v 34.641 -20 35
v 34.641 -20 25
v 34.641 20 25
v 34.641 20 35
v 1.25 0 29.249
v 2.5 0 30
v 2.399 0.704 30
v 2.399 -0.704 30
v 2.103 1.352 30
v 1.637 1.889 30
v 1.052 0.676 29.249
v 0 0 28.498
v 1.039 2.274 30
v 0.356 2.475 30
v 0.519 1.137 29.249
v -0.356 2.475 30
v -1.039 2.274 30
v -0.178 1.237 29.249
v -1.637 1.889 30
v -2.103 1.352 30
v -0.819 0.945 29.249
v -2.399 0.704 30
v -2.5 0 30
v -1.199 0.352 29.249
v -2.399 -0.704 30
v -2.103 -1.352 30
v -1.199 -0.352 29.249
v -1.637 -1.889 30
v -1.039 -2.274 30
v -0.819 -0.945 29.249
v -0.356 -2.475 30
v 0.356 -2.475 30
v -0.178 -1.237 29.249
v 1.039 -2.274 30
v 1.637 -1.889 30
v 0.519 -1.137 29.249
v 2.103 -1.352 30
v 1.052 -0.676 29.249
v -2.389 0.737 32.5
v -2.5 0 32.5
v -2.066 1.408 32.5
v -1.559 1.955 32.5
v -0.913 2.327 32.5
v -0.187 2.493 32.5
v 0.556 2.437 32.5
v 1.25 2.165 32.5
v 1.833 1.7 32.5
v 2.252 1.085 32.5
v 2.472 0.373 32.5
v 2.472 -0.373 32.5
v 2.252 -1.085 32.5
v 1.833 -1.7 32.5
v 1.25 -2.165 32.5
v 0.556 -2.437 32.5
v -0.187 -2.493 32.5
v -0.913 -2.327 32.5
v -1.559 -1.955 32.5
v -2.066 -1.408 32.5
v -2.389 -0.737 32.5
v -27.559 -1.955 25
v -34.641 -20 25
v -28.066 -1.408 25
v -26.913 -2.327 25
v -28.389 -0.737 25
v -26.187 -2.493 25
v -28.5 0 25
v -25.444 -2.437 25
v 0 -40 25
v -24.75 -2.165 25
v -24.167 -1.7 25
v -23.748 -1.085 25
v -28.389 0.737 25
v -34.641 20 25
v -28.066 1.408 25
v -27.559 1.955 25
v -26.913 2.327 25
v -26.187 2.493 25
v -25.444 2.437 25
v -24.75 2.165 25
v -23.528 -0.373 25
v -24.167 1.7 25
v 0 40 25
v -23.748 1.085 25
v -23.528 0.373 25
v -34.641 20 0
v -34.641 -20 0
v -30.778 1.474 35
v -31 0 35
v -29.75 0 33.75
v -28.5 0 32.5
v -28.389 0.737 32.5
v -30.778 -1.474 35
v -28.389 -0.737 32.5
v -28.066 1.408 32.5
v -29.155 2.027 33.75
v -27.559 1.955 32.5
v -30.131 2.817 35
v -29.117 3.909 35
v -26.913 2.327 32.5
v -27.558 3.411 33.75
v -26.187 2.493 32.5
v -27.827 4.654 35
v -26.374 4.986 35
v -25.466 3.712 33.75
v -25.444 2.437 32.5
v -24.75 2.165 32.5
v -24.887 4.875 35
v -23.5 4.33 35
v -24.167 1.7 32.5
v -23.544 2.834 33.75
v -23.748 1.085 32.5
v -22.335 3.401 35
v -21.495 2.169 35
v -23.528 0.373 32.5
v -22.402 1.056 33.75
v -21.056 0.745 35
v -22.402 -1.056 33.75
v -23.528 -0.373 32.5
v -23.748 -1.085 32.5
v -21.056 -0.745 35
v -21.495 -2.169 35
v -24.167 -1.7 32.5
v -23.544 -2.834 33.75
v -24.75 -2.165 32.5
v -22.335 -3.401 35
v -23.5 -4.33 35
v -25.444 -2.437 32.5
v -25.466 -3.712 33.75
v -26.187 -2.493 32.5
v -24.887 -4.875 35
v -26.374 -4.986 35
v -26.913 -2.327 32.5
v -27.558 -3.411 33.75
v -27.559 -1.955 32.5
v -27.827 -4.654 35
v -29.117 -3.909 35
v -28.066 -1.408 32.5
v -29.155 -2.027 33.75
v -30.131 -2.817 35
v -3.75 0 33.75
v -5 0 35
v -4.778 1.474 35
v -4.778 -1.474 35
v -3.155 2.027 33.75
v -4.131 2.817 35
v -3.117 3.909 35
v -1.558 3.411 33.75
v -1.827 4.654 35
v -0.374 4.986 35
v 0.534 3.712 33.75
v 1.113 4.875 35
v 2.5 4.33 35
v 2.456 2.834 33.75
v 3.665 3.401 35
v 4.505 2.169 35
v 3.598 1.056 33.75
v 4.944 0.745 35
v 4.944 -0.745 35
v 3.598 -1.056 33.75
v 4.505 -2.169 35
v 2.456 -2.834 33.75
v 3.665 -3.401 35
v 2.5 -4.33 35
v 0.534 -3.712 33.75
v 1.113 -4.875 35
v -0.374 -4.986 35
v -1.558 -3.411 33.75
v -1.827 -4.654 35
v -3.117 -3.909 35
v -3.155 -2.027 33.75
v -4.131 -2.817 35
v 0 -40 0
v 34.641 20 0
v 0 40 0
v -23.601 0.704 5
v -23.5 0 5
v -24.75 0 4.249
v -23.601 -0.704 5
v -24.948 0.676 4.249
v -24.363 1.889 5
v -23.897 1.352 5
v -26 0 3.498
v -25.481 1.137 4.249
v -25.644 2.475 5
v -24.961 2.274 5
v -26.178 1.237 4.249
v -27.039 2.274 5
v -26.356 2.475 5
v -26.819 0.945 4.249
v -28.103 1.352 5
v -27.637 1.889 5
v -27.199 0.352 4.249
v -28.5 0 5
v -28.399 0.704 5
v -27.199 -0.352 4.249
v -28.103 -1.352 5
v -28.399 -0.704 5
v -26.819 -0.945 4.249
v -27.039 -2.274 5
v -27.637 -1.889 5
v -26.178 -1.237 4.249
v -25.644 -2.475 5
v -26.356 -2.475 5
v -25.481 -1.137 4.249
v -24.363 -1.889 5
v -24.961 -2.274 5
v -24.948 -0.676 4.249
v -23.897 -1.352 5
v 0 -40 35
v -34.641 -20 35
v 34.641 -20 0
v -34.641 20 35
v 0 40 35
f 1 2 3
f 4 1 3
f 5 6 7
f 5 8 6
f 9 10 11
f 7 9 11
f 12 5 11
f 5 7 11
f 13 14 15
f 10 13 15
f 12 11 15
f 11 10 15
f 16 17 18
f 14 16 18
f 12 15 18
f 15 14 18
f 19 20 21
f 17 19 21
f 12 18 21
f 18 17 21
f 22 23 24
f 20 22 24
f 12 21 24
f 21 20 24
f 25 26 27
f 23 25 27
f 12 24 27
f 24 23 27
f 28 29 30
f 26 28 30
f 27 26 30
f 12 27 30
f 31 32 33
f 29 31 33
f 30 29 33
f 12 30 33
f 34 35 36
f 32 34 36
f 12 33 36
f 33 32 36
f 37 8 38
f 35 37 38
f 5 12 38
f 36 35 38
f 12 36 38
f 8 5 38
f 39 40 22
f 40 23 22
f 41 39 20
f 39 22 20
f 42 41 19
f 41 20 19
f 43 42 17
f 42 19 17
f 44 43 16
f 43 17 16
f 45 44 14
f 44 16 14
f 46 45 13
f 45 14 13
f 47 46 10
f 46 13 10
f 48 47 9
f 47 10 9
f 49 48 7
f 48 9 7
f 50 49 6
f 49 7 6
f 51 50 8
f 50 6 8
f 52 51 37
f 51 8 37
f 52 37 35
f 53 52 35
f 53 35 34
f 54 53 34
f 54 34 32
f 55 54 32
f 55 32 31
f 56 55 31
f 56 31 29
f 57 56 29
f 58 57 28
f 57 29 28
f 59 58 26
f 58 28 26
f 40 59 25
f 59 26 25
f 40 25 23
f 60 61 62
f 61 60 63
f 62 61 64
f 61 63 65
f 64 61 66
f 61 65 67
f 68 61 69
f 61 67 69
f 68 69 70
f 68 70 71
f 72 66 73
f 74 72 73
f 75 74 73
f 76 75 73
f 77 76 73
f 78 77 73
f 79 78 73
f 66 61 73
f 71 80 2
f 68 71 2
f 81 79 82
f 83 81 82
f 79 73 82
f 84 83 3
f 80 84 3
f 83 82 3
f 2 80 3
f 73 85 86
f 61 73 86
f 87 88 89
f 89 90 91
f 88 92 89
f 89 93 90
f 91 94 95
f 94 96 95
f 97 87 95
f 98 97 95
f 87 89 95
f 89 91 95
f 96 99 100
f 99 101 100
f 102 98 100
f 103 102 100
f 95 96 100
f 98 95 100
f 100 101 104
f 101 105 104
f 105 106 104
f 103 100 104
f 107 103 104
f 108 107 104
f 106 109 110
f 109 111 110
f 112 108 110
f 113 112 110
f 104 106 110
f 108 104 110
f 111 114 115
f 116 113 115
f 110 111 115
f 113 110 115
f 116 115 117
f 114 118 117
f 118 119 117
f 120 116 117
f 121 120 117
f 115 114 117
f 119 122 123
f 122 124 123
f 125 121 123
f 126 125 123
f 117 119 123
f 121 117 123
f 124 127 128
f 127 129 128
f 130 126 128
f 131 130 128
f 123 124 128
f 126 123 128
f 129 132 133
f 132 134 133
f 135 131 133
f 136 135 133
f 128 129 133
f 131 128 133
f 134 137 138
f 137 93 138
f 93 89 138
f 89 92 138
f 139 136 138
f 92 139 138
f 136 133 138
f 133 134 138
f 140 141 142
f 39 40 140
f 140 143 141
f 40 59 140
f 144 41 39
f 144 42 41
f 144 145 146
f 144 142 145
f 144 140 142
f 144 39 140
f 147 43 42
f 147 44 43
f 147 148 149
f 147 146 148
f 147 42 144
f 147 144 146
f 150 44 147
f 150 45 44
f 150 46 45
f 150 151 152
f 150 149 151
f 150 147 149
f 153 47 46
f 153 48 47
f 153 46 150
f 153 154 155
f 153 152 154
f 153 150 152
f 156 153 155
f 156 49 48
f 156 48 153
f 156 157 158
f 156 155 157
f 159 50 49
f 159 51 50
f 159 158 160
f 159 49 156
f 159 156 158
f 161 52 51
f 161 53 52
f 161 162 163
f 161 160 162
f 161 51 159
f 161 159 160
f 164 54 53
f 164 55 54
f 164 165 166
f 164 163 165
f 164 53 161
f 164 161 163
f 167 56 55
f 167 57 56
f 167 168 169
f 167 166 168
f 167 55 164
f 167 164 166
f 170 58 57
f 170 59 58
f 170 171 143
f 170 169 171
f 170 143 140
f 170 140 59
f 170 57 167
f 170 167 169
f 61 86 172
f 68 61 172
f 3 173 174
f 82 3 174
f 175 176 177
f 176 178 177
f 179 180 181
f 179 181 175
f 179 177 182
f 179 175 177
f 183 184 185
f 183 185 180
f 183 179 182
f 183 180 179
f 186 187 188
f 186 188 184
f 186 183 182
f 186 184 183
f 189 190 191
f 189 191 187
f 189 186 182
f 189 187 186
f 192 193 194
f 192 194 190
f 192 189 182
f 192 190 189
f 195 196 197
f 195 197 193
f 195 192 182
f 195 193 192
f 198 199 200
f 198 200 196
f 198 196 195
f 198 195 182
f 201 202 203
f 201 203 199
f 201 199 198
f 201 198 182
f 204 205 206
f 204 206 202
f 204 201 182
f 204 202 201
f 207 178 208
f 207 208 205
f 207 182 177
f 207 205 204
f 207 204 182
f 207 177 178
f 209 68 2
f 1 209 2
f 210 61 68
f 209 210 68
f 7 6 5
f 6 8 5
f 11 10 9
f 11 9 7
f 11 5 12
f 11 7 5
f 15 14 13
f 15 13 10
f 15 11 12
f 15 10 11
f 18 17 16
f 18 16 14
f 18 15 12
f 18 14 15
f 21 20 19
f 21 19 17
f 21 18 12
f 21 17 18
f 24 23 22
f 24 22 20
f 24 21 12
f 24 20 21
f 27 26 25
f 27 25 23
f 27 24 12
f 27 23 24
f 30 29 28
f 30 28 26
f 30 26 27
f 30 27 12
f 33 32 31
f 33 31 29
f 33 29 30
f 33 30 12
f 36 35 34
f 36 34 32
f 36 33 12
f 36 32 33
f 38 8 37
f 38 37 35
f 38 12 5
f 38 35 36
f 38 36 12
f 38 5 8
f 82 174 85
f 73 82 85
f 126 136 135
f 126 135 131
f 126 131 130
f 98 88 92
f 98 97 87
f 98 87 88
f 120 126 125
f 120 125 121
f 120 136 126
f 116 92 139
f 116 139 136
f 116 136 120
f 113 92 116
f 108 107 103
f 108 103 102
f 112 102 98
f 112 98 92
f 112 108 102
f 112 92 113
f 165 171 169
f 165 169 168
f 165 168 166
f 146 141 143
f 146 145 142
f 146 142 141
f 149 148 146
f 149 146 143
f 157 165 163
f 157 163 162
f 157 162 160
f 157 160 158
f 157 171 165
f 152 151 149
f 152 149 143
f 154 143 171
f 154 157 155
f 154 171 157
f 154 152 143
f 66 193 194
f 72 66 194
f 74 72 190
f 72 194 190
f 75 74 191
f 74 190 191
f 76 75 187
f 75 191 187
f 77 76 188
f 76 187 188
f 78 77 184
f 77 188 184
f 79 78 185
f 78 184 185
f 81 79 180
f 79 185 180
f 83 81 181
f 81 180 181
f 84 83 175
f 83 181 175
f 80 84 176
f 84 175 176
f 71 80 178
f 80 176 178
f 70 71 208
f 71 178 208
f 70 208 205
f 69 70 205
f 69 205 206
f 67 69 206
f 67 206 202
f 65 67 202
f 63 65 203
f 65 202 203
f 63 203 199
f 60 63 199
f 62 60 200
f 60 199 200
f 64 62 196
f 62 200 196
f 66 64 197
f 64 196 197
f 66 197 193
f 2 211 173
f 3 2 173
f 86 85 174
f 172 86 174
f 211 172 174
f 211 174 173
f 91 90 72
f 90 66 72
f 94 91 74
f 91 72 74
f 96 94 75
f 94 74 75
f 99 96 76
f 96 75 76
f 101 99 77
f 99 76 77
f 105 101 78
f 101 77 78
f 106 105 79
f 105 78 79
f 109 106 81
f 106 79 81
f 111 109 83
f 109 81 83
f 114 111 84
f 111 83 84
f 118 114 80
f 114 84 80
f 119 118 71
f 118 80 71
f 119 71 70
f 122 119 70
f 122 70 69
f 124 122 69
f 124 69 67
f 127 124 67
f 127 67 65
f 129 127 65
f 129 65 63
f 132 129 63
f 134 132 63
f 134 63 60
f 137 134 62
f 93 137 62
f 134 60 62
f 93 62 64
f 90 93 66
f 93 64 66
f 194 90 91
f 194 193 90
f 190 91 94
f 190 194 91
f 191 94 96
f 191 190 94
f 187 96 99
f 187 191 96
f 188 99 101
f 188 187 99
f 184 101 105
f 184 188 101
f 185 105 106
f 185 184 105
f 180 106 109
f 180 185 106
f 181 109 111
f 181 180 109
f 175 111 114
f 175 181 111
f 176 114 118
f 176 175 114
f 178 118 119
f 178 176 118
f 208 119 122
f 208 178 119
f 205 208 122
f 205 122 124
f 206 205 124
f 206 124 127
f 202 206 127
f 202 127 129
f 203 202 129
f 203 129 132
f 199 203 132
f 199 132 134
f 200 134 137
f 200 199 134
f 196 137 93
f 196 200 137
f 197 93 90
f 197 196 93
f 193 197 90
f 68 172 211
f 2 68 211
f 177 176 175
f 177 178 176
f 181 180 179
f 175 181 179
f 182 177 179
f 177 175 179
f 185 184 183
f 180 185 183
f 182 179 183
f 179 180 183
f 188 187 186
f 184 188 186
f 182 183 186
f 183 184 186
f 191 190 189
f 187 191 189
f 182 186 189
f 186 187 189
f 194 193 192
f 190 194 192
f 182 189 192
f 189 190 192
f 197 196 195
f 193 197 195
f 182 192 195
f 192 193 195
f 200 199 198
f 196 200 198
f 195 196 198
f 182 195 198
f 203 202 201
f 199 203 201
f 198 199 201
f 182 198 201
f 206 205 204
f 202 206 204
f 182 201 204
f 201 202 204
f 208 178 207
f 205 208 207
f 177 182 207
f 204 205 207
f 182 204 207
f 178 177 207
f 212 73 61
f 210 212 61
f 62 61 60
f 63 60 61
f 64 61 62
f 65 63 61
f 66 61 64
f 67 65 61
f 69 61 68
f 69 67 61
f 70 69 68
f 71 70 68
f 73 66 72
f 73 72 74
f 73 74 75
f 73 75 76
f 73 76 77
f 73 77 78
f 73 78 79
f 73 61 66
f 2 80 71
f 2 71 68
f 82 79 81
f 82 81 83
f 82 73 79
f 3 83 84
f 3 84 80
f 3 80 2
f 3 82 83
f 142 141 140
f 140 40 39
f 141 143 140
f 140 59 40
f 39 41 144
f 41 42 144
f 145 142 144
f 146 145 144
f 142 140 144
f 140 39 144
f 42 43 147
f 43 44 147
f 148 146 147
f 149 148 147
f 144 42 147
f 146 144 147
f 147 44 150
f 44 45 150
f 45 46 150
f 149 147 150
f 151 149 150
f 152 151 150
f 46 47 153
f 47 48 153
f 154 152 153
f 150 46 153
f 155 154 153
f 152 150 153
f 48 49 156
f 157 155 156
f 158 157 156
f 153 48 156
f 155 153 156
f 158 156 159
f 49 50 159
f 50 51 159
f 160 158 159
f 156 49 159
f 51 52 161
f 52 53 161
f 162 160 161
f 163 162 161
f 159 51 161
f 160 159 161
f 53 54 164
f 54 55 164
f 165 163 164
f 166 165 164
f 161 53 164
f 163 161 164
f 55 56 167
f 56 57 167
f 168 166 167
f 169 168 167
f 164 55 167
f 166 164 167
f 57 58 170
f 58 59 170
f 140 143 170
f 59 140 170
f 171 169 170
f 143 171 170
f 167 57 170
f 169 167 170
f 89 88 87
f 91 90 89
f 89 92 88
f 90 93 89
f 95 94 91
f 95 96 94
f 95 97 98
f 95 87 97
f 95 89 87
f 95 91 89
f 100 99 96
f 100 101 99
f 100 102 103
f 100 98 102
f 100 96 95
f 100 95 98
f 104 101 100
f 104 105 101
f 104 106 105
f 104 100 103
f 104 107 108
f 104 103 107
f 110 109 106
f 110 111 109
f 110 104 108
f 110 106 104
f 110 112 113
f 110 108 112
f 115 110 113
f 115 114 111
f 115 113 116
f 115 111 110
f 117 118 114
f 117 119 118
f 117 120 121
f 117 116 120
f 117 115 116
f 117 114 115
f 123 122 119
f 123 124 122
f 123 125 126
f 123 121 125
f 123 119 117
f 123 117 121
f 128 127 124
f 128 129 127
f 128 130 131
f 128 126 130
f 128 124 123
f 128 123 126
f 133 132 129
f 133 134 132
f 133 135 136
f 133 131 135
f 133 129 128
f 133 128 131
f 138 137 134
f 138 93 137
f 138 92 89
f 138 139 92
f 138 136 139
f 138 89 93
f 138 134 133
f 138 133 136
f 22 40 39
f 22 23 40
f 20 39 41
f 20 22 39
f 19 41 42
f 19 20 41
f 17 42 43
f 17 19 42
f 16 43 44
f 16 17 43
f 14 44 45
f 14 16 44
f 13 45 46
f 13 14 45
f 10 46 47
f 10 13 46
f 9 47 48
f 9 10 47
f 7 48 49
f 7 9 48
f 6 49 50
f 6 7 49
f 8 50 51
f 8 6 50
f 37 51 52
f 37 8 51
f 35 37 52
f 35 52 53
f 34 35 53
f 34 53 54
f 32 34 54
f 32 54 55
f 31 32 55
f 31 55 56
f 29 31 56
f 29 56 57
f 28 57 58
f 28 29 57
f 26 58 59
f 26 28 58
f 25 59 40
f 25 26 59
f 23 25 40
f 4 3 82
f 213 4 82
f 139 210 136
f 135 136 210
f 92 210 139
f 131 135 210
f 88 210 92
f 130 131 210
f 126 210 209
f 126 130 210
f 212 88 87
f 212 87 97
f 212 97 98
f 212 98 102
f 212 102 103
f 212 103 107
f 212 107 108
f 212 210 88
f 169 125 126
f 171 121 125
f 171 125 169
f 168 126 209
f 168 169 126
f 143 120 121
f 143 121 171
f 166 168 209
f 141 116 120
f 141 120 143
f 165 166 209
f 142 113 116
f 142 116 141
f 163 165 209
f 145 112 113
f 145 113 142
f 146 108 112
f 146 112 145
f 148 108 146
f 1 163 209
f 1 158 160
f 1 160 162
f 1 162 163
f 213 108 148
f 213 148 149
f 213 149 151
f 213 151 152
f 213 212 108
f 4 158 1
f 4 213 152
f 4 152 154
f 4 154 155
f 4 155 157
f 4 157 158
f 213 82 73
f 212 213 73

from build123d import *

# Parameters (mm, degrees)
F1_DEPTH         = 25
F3_DEPTH         = 10
F5_D             = 5
F5_DEPTH         = 30
F5_CSINK_D       = 10
F5_CSINK_ANGLE   = 90
F5_TIP           = 1.5021515476
F5_2_D           = 5
F5_2_DEPTH       = 30
F5_2_CSINK_D     = 10
F5_2_CSINK_ANGLE = 90
F5_2_TIP         = 1.5021515476
F6_R             = 5
F7_DEPTH         = 35
F10_D            = 5
F10_DEPTH        = 5
F10_CSINK_D      = 10
F10_CSINK_ANGLE  = 90
F10_TIP          = 1.5021515476
F11_R            = 5
F12_DEPTH        = 10


with BuildPart() as f1:
    # F0 (on Top) → F1 (new body)
    with BuildSketch(Plane.XY):
        Polygon((0, 40), (-34.6410161514, 20), (-34.6410161514, -20), (0, -40), (34.6410161514, -20), (34.6410161514, 20), align=None)
    extrude(amount=F1_DEPTH)

    # F5
    with Locations(Plane.XY.offset(35)):
        with Locations((-26, 0)):
            CounterSinkHole(F5_D / 2, F5_CSINK_D / 2, depth=F5_DEPTH, counter_sink_angle=F5_CSINK_ANGLE)
            with Locations((0, 0, -(F5_DEPTH + F5_TIP / 2))):  # 118° drill point
                Cone(0, F5_D / 2, F5_TIP, mode=Mode.SUBTRACT)


with BuildPart() as f3:
    # F2 (on face) → F3 (new body)
    with BuildSketch(Plane.XY.offset(25)):
        Polygon((34.6410161514, 20), (0, 40), (-34.6410161514, 20), (-34.6410161514, -20), (0, -40), (34.6410161514, -20), align=None)
    extrude(amount=F3_DEPTH)

    # F5#2
    with Locations(Plane.XY.offset(35)):
        with Locations((-26, 0)):
            CounterSinkHole(F5_2_D / 2, F5_2_CSINK_D / 2, depth=F5_2_DEPTH, counter_sink_angle=F5_2_CSINK_ANGLE)
            with Locations((0, 0, -(F5_2_DEPTH + F5_2_TIP / 2))):  # 118° drill point
                Cone(0, F5_2_D / 2, F5_2_TIP, mode=Mode.SUBTRACT)


with BuildPart() as f7:
    # F6 (on face) → F7 (new body, through all)
    with BuildSketch(Plane.XY.offset(35)):
        with Locations((-26, 0)):
            Circle(F6_R)
    extrude(amount=-F7_DEPTH)

    # F8: cut F3, F1
    add(f3.part, mode=Mode.SUBTRACT)
    add(f1.part, mode=Mode.SUBTRACT)


with BuildPart() as f3_1:
    add(f3.part)

    # F10
    with Locations(Plane.XY.offset(35)):
        with Locations((0, 0)):
            CounterSinkHole(F10_D / 2, F10_CSINK_D / 2, depth=F10_DEPTH, counter_sink_angle=F10_CSINK_ANGLE)
            with Locations((0, 0, -(F10_DEPTH + F10_TIP / 2))):  # 118° drill point
                Cone(0, F10_D / 2, F10_TIP, mode=Mode.SUBTRACT)


with BuildPart() as f12:
    # F11 (on face) → F12 (new body, through all)
    with BuildSketch(Plane.XY.offset(35)):
        Circle(F11_R)
    extrude(amount=-F12_DEPTH)

    # F13: cut F3
    add(f3_1.part, mode=Mode.SUBTRACT)


solid = Compound([f1.part, f7.part, f3_1.part, f12.part])
